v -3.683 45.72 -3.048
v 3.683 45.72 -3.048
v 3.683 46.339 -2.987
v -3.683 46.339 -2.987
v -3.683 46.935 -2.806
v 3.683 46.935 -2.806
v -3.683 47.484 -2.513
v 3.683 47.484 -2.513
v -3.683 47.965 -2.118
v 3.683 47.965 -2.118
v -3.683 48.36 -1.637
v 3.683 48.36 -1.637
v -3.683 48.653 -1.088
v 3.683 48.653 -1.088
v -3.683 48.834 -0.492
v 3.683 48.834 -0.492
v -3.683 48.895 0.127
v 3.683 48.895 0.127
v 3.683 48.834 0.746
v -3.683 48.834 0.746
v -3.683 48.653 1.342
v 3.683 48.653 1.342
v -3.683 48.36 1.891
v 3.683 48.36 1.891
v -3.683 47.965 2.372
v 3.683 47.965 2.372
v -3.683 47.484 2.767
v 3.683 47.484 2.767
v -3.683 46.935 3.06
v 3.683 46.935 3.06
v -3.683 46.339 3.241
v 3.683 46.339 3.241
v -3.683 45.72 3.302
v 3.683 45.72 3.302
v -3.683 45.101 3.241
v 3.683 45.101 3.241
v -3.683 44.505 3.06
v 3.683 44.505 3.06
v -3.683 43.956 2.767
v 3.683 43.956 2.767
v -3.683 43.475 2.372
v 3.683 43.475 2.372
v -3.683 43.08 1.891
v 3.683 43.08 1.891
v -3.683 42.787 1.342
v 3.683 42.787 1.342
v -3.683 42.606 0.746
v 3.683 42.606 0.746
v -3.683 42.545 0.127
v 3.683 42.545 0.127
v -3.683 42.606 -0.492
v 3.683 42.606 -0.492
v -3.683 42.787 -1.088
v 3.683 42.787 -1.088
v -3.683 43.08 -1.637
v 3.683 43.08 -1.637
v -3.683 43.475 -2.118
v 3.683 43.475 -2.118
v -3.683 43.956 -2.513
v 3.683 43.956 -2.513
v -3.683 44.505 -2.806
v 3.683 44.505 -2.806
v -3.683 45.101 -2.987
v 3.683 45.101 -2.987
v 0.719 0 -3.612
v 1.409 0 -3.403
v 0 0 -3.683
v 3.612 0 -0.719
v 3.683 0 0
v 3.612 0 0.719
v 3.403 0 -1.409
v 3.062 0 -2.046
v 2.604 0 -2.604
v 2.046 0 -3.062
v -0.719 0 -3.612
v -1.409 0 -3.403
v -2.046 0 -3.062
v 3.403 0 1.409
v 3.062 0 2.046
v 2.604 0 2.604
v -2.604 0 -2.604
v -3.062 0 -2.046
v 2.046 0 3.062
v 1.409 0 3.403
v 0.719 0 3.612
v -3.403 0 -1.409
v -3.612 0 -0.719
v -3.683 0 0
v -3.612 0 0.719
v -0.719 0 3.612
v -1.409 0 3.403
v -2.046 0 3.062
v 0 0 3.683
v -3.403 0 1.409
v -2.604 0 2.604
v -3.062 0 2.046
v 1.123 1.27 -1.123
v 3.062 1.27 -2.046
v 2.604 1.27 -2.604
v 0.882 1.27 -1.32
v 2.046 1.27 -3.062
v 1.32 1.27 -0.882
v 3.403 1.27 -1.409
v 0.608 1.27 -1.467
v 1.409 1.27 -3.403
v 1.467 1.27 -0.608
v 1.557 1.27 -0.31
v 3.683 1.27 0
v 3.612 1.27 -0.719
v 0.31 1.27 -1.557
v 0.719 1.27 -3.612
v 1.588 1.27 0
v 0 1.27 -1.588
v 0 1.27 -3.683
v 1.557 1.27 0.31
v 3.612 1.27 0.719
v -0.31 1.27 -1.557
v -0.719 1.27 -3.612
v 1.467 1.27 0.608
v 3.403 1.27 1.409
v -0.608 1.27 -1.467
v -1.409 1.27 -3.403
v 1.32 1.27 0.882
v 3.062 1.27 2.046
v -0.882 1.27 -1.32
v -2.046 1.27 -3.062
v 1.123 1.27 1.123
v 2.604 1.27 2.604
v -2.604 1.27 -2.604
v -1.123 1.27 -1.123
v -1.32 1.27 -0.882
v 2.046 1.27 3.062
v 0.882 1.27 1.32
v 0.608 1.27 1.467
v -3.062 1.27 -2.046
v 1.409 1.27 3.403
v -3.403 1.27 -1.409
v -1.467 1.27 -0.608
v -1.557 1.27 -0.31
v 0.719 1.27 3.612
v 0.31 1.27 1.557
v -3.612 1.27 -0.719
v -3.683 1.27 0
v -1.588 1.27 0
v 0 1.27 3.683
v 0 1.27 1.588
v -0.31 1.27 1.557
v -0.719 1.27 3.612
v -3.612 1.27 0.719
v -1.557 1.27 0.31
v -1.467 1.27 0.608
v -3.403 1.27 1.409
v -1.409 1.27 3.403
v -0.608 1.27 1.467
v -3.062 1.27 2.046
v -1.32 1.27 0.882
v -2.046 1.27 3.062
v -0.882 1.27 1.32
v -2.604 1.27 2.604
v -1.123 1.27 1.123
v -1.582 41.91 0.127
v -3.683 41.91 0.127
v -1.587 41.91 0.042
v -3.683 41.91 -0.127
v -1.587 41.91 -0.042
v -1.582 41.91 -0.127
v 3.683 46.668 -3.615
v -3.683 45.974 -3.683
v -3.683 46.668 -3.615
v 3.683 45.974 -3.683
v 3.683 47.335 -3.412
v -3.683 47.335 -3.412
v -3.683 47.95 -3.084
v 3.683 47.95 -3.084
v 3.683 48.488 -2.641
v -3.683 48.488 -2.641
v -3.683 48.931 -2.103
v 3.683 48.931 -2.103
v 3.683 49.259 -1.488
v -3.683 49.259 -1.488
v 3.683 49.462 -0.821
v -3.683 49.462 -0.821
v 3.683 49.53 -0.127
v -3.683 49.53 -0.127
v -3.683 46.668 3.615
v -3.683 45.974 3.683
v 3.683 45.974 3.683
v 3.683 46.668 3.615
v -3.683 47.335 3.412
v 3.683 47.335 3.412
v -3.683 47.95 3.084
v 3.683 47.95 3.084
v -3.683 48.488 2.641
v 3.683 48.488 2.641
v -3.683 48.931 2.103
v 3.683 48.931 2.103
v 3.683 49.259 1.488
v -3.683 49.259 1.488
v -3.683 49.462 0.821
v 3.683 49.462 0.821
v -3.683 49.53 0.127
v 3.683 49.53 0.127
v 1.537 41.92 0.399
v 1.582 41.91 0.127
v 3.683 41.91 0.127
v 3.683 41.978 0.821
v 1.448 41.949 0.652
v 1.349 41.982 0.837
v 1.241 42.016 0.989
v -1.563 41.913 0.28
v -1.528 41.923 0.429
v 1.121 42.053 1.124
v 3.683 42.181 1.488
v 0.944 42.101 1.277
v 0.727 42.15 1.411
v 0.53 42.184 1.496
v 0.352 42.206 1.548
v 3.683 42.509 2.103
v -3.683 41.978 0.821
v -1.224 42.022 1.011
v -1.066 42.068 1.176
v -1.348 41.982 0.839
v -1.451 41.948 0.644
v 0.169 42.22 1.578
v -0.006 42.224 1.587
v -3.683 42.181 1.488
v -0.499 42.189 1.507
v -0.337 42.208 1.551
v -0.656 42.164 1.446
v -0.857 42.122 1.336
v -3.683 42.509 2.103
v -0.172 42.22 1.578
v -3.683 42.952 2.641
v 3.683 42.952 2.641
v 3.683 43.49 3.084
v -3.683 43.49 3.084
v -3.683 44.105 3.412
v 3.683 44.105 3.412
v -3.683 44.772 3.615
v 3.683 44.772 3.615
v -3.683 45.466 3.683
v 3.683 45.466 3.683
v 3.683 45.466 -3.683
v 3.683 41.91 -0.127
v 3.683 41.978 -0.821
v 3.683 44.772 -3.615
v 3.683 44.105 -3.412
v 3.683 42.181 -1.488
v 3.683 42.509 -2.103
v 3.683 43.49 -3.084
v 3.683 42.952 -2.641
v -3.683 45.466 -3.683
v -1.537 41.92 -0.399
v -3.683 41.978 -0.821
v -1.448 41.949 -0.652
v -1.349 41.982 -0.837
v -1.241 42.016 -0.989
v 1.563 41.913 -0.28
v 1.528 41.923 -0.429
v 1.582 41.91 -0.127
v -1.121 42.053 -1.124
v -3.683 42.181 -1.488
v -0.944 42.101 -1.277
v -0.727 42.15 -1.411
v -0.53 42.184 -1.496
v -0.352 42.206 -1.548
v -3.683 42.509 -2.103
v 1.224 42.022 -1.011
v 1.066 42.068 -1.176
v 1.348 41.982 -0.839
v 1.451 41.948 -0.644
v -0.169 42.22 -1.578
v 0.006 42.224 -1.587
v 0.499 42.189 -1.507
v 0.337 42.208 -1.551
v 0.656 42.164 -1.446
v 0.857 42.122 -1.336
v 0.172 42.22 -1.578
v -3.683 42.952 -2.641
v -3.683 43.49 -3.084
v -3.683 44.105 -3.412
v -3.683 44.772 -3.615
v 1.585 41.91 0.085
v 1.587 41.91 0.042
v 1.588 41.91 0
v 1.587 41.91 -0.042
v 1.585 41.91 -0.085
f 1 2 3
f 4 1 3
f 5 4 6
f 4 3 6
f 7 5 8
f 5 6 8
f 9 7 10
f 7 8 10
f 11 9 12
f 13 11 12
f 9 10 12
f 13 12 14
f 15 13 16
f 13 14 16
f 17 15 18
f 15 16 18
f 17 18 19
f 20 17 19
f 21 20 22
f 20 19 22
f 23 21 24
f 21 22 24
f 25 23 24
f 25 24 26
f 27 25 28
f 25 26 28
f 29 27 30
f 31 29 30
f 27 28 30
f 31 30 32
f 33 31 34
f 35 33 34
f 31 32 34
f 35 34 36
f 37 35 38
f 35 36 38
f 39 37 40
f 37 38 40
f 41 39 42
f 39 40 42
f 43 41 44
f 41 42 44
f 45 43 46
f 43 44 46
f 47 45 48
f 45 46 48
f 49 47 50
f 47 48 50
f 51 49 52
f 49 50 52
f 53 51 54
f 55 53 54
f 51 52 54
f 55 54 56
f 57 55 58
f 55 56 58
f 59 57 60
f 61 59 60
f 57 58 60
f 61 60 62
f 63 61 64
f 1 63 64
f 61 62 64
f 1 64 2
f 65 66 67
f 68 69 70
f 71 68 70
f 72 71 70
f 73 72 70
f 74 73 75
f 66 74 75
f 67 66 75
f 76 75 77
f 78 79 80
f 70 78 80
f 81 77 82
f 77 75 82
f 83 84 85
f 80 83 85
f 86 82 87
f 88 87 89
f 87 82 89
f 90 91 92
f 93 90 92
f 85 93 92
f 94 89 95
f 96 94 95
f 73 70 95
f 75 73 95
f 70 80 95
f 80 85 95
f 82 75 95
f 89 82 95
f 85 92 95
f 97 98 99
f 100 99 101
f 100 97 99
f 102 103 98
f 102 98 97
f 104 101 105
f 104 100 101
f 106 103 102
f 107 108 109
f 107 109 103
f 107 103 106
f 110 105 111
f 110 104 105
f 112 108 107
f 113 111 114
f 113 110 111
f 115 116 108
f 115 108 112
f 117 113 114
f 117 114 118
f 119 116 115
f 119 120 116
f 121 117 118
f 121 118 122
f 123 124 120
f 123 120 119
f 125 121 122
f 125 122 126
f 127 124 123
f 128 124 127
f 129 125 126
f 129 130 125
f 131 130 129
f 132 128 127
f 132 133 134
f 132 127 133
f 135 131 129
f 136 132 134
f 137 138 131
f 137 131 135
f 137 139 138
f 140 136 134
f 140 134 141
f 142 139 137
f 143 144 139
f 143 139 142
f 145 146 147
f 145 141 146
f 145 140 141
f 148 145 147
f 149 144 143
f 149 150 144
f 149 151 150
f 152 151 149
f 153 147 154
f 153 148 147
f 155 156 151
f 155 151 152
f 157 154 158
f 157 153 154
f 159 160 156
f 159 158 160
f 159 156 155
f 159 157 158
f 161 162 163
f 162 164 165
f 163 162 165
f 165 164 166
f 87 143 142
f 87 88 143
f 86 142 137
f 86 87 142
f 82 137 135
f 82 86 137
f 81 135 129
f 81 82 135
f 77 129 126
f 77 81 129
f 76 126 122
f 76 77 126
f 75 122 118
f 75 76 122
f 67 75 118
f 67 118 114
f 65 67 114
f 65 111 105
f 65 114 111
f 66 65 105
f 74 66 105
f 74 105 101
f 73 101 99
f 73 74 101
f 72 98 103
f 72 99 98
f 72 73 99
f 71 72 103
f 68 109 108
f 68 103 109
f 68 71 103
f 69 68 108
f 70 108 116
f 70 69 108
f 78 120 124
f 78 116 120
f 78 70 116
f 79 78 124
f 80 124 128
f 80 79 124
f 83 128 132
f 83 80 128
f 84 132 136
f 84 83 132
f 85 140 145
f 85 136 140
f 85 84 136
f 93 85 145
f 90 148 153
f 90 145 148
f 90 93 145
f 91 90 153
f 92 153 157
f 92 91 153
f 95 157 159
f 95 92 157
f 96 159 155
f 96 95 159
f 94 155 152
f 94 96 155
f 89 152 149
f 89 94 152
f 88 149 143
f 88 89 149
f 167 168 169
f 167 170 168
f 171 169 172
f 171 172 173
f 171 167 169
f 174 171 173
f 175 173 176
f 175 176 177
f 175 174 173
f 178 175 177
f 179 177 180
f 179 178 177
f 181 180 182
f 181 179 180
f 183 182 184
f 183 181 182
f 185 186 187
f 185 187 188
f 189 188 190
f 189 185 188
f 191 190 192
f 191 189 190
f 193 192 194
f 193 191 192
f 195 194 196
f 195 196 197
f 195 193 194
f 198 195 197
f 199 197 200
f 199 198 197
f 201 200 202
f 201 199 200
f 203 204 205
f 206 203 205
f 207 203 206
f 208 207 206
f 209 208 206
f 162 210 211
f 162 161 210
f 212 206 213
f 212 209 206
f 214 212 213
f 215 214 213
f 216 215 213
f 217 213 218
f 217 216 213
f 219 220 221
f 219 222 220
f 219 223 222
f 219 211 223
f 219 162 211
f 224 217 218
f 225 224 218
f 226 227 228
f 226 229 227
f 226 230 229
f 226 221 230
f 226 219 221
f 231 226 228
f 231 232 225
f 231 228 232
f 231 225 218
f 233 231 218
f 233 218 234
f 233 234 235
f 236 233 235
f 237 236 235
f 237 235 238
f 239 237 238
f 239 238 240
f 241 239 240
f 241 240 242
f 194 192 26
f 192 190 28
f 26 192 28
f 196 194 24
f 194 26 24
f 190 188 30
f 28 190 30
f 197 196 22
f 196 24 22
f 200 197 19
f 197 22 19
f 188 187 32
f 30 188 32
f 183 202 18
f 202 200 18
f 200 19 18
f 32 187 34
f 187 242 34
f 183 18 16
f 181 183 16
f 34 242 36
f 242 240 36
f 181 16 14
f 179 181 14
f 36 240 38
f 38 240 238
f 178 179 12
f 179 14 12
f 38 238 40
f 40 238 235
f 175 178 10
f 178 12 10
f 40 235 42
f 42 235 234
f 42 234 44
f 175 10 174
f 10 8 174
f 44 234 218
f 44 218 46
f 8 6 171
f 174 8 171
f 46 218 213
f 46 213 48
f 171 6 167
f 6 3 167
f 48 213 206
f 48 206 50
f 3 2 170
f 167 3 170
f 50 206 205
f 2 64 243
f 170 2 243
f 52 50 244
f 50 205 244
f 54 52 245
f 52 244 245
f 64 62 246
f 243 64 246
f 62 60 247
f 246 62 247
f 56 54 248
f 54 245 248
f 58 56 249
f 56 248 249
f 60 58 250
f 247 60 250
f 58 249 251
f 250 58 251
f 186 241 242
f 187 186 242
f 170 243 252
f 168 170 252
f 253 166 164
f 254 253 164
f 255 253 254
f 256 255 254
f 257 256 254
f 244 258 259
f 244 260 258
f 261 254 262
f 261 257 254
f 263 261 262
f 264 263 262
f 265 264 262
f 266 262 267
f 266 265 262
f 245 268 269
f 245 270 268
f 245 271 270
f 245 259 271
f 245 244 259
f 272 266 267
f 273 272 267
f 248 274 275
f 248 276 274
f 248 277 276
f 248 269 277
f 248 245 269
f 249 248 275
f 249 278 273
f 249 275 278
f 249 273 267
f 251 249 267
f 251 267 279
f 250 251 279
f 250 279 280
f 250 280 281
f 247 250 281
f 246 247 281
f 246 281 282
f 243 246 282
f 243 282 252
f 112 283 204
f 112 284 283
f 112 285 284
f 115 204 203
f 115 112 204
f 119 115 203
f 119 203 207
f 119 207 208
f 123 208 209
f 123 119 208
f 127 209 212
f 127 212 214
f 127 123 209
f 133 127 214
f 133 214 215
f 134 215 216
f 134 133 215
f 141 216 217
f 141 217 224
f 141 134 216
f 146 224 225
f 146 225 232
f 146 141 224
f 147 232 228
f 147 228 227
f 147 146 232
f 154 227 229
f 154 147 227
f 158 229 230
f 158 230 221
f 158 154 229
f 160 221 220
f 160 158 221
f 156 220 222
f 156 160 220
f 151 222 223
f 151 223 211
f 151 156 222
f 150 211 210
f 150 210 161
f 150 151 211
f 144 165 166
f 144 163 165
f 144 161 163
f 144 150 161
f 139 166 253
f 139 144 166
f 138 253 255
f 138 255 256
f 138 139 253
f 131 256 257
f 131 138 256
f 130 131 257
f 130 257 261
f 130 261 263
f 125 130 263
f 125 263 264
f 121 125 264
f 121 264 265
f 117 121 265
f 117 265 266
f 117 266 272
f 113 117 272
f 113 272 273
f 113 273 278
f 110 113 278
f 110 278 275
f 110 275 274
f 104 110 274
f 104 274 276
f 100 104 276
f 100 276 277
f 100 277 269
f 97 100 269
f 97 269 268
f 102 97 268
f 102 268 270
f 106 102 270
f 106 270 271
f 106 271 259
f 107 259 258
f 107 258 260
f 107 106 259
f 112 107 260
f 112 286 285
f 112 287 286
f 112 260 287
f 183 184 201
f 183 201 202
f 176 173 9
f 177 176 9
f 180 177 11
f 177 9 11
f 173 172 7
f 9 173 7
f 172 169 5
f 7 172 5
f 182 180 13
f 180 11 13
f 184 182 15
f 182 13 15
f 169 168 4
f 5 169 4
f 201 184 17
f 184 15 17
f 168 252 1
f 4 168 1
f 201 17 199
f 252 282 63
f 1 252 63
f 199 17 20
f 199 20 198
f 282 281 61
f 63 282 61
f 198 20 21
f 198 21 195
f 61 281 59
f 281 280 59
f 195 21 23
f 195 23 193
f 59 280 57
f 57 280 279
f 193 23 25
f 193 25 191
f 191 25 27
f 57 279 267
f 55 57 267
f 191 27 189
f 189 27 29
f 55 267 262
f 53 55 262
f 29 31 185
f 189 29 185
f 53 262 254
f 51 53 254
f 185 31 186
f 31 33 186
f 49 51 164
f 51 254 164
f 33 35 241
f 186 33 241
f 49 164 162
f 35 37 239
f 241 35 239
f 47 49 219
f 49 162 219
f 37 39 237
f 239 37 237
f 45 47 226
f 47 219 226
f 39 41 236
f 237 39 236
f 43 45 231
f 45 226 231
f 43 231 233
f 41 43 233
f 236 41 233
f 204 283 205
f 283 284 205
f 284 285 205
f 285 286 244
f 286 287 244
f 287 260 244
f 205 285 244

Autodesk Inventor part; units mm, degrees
ref_plane "YZ Plane" through (0, 0, 0) normal (1, 0, 0) x (0, 1, 0)
ref_plane "XZ Plane" through (0, 0, 0) normal (0, 1, 0) x (-1, 0, 0)
ref_plane "XY Plane" through (0, 0, 0) normal (0, 0, 1) x (1, 0, 0)
sketch "Sketch1" plane through (0, 0, 0) normal (0, 1, 0) x (-1, 0, 0)
  circle A0 centre (0, 0) radius 3.683
  dimension "d0" = 7.366
extrude "Extrusion1" add sketch "Sketch1" along normal blind 1.27
sketch "Sketch2" plane through (0, 1.27, 0) normal (0, 1, 0) x (1, 0, 0)
  circle A0 centre (0, 0) radius 1.5875
  dimension "d3" = 3.175
extrude "Extrusion2" add sketch "Sketch2" along normal blind 40.64
sketch "Sketch3" plane through (0, 41.91, 0) normal (0, 1, 0) x (1, 0, 0)
  line L0 (3.683, 3.683) -> (-3.683, 3.683)
  line L1 (-3.683, 3.683) -> (-3.683, -3.683)
  line L2 (-3.683, -3.683) -> (3.683, -3.683)
  line L3 (3.683, -3.683) -> (3.683, 3.683)
  line L4 (3.683, 3.683) -> (-3.683, -3.683) construction
  line L5 (-3.683, 3.683) -> (3.683, -3.683) construction
  point P0 (0, 0)
extrude "Extrusion3" add sketch "Sketch3" along normal blind 7.62
sketch "Sketch4" plane through (3.683, 41.91, 3.683) normal (1, 0, 0) x (0, 0, -1)
  circle A0 centre (3.556, 3.81) radius 3.175
  line L0 (7.366, 7.62) -> (0, 7.62) projected
  line L1 (7.366, 0) -> (7.366, 7.62) projected
  point P0 (3.683, -41.91)
  dimension "d8" = 3.81
  dimension "d9" = 3.81
  dimension "d10" = 6.35
extrude "Extrusion4" cut sketch "Sketch4" against normal blind 7.62
fillet "Fillet1" radius 3.556 4 edges at (0, 41.91, 3.683) (0, 49.53, 3.683) (0, 49.53, -3.683) (0, 41.91, -3.683)
properties part number "piston2"
